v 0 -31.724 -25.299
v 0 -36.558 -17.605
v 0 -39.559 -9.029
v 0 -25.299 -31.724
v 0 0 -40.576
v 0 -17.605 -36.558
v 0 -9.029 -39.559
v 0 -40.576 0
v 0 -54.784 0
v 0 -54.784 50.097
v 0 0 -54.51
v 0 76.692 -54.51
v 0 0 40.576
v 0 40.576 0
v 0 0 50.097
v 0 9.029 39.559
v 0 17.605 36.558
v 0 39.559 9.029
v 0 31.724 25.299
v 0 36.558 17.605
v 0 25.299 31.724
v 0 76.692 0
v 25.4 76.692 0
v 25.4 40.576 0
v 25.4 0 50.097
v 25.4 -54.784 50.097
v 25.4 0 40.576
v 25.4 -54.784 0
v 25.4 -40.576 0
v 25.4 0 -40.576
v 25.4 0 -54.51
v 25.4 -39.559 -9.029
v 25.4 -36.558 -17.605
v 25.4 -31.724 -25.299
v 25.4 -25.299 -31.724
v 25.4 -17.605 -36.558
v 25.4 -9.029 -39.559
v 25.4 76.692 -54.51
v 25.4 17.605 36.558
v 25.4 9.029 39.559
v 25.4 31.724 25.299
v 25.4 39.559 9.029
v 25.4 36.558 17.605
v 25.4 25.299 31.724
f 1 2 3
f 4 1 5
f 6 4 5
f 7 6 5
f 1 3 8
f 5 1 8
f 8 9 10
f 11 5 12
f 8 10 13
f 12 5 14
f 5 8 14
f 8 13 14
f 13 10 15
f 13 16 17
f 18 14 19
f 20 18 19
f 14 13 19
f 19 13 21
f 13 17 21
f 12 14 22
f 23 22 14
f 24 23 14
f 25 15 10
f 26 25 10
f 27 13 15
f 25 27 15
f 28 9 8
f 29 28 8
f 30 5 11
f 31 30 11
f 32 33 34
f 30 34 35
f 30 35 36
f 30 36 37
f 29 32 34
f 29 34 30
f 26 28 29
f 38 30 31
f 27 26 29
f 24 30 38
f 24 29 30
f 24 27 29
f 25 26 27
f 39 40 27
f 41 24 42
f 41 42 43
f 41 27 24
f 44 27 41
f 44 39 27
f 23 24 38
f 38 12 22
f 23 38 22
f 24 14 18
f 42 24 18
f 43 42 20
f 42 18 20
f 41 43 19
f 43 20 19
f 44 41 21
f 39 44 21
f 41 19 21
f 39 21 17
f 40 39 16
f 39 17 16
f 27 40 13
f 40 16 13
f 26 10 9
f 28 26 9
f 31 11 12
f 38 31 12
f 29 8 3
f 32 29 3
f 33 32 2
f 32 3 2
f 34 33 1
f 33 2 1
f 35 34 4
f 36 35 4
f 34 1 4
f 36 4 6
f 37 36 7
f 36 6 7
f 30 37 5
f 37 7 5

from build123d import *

# Parameters (mm, degrees)
F1_DEPTH = 25.4


with BuildPart() as f1:
    # F0 (on Right) → F1 (new body)
    with BuildSketch(Plane.YZ):
        with BuildLine():
            Line((0, 0), (40.5764031263, 0))
            ThreePointArc((40.5764031263, 0), (28.6918498068, 28.6918498068), (0, 40.5764031263))
            Line((0, 40.5764031263), (0, 0))
        make_face()
        with BuildLine():
            Line((76.691634953, 0), (40.5764031263, 0))
            ThreePointArc((40.5764031263, 0), (28.6918498068, -28.6918498068), (0, -40.5764031263))
            Line((0, -40.5764031263), (0, -54.5102506876))
            Line((0, -54.5102506876), (76.691634953, -54.5102506876))
            Line((76.691634953, -54.5102506876), (76.691634953, 0))
        make_face()
        with BuildLine():
            ThreePointArc((0, -40.5764031263), (28.6918498068, -28.6918498068), (40.5764031263, 0))
            Line((40.5764031263, 0), (0, 0))
            Line((0, 0), (0, -40.5764031263))
        make_face()
        with BuildLine():
            Line((0, 0), (0, 40.5764031263))
            ThreePointArc((0, 40.5764031263), (-28.6918498068, 28.6918498068), (-40.5764031263, 0))
            Line((-40.5764031263, 0), (0, 0))
        make_face()
        with BuildLine():
            ThreePointArc((-40.5764031263, 0), (-28.6918498068, 28.6918498068), (0, 40.5764031263))
            Line((0, 40.5764031263), (0, 50.0971861184))
            Line((0, 50.0971861184), (-54.7840930521, 50.0971861184))
            Line((-54.7840930521, 50.0971861184), (-54.7840930521, 0))
            Line((-54.7840930521, 0), (-40.5764031263, 0))
        make_face()
        with BuildLine():
            ThreePointArc((-40.5764031263, 0), (-28.6918498068, -28.6918498068), (0, -40.5764031263))
            Line((0, -40.5764031263), (0, 0))
            Line((0, 0), (-40.5764031263, 0))
        make_face()
    extrude(amount=F1_DEPTH)


solid = f1.part
